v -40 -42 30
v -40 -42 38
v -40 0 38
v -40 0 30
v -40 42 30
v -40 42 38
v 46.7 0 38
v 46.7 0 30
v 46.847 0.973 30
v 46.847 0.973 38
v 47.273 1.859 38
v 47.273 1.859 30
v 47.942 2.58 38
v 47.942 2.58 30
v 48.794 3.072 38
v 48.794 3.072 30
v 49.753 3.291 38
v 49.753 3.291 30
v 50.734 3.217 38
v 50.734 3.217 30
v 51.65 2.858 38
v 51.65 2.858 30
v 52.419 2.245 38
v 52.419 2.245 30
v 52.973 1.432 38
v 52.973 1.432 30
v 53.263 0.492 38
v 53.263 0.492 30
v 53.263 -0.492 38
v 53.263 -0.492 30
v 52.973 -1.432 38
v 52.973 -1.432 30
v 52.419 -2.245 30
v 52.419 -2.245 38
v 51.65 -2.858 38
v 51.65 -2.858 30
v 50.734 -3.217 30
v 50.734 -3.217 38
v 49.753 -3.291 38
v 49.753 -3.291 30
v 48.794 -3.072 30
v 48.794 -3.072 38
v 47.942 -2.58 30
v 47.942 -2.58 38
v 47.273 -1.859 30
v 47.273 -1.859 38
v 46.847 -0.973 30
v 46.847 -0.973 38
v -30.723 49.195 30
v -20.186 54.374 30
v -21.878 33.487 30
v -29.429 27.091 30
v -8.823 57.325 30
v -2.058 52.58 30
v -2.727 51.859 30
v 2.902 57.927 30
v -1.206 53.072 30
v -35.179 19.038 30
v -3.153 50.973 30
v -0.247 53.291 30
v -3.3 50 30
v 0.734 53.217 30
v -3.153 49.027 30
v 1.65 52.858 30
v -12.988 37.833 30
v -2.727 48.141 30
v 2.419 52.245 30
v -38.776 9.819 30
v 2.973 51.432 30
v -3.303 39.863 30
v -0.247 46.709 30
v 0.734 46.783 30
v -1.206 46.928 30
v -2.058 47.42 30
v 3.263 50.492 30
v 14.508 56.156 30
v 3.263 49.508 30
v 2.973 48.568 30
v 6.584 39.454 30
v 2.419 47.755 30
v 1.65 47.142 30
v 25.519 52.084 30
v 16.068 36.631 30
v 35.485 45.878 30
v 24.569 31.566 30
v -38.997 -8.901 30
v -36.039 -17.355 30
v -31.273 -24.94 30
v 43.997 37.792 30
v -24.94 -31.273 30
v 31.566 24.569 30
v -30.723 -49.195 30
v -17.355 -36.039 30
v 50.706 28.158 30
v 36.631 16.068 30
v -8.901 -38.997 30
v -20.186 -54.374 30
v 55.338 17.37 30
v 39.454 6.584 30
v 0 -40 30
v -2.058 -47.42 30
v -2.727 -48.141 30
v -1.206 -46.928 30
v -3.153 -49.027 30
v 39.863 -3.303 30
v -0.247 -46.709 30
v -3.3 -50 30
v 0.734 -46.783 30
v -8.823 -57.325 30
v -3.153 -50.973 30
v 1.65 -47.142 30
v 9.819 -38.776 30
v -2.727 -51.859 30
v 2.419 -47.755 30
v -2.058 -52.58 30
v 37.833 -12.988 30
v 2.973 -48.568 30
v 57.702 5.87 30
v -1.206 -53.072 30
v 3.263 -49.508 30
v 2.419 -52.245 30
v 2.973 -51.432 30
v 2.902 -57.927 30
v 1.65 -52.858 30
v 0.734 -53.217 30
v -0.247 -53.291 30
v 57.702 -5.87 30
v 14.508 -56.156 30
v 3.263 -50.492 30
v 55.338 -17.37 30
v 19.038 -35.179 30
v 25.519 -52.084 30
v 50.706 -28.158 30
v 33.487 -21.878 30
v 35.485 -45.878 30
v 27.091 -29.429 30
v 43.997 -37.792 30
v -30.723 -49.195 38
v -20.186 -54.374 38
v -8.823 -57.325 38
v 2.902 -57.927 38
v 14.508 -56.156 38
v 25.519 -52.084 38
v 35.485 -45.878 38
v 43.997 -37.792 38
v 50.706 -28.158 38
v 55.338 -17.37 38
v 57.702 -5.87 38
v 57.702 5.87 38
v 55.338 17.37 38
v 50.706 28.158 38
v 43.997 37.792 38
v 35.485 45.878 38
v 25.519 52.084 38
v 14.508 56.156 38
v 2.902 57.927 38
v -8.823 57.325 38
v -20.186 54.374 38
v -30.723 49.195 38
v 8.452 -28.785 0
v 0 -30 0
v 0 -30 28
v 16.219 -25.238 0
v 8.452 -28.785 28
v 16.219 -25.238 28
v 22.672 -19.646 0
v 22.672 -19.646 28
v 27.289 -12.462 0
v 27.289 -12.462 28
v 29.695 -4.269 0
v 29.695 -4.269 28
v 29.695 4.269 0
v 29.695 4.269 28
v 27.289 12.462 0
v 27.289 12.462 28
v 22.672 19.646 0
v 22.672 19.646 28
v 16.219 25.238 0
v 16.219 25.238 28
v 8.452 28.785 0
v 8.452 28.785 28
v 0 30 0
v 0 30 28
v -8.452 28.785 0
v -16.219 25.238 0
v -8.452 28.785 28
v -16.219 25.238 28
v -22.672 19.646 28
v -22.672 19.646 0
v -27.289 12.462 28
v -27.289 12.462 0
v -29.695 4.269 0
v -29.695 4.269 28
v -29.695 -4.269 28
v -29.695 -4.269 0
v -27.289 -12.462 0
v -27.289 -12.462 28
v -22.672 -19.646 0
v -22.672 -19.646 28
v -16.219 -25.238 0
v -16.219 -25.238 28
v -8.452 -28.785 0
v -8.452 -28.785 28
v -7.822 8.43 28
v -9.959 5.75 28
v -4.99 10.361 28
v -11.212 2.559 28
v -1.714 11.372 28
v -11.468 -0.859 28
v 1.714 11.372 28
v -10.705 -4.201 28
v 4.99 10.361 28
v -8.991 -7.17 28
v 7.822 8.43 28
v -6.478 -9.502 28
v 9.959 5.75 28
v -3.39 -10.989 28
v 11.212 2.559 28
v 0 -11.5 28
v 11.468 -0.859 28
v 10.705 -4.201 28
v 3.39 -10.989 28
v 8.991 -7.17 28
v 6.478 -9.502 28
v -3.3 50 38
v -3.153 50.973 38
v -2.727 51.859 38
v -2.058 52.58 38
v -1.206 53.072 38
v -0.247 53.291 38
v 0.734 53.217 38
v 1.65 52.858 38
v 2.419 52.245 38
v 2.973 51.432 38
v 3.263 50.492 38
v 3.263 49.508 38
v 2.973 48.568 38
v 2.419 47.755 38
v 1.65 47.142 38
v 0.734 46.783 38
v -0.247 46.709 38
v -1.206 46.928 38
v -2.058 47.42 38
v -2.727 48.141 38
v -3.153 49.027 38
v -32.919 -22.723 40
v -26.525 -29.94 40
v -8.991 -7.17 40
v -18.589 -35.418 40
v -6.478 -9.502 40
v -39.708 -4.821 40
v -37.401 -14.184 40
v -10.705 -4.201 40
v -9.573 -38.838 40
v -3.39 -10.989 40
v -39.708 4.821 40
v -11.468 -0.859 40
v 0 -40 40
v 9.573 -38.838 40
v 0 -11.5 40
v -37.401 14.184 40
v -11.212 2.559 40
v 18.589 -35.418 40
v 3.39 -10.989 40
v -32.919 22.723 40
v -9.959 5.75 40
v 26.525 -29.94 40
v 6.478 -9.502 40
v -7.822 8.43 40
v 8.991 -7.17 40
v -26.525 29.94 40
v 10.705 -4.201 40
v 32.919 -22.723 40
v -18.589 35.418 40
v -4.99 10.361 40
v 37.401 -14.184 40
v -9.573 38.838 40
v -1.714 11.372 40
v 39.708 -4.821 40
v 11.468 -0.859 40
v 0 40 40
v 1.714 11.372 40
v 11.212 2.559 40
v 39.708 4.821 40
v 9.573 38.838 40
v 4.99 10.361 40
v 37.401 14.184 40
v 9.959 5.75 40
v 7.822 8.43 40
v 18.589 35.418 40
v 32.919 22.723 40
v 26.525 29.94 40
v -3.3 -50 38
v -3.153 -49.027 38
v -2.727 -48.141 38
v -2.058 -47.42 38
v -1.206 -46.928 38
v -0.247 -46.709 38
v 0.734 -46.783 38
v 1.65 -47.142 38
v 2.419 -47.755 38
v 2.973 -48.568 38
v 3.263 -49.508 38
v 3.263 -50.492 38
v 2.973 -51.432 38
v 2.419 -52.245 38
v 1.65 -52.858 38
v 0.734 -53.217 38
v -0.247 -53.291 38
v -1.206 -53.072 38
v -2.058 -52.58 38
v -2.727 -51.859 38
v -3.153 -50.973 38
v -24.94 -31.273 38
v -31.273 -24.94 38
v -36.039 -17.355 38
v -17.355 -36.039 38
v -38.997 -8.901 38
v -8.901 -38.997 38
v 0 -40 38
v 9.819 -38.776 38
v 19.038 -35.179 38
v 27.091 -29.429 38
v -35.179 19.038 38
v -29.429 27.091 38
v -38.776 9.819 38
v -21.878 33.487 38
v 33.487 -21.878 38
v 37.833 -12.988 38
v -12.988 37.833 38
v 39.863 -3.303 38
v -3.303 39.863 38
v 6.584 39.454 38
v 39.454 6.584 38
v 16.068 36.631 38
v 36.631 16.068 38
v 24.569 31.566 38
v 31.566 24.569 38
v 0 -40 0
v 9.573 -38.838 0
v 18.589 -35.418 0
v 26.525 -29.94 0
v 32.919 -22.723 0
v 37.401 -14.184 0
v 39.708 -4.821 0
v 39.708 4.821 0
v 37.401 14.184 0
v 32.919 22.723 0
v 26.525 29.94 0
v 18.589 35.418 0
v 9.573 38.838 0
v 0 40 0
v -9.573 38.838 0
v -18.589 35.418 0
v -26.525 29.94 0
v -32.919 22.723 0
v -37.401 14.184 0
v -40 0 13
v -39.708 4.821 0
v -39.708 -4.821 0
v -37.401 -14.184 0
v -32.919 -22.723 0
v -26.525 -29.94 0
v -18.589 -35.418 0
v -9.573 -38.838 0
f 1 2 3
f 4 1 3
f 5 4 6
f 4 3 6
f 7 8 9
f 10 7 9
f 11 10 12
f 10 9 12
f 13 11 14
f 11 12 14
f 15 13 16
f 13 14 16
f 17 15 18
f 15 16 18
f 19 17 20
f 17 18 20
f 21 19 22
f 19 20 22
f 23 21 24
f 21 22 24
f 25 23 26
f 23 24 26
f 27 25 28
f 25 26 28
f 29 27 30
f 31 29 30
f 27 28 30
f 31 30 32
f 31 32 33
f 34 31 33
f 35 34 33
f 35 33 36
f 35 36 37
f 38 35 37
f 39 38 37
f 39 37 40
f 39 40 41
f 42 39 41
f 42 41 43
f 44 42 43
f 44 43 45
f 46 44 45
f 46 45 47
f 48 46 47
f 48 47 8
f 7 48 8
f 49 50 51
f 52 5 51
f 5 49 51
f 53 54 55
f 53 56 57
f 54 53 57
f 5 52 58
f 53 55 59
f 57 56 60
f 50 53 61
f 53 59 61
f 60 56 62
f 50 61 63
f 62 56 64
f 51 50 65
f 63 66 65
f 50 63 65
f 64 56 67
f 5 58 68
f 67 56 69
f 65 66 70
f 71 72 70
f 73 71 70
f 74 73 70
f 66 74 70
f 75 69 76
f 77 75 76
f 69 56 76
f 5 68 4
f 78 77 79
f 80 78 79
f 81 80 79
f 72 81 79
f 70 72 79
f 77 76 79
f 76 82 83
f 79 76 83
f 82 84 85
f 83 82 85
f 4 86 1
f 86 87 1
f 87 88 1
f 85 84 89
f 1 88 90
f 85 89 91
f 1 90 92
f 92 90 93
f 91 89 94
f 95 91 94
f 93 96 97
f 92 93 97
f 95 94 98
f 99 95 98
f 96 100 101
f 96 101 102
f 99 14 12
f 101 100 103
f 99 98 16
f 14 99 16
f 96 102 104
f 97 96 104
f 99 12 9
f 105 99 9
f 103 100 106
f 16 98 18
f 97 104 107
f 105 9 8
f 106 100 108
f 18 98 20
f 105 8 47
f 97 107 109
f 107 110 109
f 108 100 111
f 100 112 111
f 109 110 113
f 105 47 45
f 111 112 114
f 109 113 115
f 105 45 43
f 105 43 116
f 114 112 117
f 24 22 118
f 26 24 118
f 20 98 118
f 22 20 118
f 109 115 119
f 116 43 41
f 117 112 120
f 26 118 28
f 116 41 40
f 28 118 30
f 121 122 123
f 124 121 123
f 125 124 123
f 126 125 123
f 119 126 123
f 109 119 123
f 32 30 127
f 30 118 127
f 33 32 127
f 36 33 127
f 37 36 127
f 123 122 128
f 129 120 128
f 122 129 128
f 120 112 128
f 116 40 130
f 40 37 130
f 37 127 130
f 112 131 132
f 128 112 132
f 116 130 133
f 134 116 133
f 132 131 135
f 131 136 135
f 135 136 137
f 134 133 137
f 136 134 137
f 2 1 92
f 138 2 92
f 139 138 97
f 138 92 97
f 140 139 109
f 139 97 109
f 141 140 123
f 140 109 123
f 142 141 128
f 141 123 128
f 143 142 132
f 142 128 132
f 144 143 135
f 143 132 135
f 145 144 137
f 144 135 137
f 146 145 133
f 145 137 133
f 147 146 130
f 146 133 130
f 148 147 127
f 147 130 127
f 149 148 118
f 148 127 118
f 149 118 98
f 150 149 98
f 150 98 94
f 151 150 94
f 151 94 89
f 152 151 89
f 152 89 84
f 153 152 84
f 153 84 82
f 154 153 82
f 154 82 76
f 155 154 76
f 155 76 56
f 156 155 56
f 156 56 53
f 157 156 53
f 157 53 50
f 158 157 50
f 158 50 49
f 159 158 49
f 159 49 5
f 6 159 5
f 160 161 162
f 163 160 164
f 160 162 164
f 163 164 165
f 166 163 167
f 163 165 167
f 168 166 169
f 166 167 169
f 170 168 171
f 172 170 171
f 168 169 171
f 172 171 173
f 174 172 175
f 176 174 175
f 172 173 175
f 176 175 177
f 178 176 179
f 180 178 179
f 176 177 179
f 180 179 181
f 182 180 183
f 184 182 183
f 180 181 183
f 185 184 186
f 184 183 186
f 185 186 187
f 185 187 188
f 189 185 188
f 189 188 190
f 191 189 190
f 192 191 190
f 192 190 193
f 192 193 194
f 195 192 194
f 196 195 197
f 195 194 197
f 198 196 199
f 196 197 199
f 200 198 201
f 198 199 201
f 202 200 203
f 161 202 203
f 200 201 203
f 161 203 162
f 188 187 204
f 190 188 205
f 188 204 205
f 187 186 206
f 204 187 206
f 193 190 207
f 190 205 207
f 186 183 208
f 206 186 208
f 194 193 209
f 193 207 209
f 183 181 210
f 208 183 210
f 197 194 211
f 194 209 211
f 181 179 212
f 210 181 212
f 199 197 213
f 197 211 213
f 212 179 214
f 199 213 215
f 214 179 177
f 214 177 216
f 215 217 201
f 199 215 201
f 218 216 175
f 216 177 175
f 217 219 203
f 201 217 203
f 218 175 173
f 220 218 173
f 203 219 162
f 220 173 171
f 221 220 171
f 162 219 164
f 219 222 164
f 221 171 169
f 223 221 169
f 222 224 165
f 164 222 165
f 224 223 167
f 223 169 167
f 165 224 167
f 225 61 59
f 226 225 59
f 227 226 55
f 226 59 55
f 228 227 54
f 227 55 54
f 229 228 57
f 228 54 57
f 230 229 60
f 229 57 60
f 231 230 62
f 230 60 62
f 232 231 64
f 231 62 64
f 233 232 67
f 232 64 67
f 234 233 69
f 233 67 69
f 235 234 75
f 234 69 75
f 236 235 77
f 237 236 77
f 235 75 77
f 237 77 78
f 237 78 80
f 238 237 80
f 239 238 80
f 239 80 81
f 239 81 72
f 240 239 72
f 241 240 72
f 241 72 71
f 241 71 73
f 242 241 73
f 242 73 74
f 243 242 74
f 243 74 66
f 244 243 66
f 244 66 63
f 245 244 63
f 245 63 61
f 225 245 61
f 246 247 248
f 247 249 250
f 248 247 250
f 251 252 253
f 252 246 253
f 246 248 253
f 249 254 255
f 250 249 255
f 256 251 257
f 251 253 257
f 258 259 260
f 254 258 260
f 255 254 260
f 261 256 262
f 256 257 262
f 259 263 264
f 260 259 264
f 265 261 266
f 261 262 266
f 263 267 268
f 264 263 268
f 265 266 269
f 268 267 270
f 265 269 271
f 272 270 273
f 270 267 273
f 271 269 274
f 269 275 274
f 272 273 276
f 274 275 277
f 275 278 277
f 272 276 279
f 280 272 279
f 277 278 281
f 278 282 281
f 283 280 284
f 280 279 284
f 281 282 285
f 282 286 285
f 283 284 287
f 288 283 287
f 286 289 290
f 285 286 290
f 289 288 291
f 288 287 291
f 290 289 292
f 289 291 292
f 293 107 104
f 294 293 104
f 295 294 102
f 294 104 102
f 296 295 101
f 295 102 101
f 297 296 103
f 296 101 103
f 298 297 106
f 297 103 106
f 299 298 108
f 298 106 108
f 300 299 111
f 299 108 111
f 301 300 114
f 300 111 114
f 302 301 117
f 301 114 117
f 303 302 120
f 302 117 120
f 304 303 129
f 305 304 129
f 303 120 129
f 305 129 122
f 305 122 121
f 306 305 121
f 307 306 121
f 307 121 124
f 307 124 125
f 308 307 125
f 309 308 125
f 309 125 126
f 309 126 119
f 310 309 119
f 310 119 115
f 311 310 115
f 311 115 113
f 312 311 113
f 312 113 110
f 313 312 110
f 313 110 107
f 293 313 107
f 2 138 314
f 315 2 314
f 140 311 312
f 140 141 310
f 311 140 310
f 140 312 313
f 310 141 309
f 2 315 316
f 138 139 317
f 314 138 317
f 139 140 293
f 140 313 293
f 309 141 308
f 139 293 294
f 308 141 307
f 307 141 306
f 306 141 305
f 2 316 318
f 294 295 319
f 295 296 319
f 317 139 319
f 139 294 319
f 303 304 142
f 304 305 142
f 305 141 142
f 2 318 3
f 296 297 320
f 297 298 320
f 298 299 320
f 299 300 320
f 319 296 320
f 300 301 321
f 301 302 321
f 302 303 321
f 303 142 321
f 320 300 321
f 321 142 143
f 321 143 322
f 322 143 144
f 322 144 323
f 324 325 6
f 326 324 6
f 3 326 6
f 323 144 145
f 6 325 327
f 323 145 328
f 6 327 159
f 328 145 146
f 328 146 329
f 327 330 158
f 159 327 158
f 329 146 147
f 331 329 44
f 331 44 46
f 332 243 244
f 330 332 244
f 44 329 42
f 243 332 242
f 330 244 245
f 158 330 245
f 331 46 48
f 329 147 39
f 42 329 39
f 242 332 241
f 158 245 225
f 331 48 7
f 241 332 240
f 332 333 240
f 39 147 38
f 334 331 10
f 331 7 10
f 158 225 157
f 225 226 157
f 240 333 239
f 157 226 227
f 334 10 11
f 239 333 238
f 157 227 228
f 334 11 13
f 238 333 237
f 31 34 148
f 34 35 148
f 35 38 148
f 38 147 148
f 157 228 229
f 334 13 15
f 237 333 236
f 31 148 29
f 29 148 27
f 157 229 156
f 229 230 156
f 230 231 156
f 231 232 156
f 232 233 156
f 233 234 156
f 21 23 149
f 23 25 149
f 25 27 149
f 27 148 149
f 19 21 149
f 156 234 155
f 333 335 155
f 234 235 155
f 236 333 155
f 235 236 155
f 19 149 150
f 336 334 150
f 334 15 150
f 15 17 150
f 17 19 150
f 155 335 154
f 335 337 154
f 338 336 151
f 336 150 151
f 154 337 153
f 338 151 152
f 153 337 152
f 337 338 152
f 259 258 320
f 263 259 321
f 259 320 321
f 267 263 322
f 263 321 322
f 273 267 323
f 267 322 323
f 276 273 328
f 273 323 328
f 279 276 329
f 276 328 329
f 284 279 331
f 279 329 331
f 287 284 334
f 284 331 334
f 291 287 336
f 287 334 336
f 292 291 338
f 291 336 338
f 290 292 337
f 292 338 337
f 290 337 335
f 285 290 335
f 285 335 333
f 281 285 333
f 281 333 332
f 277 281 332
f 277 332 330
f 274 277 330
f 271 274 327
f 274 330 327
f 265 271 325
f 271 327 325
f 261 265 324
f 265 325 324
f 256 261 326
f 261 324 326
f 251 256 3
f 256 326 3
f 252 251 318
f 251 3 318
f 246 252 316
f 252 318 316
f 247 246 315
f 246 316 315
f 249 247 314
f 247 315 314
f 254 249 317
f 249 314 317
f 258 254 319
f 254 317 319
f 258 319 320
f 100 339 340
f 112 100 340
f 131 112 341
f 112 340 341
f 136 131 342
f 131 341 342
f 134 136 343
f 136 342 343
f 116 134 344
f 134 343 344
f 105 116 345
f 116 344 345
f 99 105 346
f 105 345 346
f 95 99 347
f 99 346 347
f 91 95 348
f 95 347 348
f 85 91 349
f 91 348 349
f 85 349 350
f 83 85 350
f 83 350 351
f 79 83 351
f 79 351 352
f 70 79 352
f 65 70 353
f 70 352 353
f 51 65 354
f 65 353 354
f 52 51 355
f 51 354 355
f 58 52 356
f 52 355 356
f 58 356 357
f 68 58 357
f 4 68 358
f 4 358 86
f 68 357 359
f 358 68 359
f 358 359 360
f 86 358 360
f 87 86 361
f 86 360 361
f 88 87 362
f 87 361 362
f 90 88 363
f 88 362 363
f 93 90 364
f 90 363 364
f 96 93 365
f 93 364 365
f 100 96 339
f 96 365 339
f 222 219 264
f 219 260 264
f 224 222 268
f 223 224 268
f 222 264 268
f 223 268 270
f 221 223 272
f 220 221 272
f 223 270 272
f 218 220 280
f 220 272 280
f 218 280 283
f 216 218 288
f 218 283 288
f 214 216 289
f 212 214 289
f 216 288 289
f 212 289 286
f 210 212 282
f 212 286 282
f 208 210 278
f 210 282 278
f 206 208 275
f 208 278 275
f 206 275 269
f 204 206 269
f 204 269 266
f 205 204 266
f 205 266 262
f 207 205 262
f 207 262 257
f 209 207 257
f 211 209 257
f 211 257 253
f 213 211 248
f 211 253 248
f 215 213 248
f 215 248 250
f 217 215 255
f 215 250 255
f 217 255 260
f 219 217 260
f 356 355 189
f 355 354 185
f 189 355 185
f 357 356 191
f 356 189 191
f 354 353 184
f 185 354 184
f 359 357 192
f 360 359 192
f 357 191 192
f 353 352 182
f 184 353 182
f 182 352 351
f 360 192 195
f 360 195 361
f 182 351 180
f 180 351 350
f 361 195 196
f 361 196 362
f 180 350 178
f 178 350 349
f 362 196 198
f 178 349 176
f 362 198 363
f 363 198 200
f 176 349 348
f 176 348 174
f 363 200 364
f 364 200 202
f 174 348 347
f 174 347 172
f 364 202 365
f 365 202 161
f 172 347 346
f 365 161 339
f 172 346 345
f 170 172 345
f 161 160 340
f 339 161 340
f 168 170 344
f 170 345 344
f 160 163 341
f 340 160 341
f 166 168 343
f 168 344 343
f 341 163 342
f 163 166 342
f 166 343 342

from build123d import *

# Parameters (mm, degrees)
F3_D     = 6.6
F5_DEPTH = 25


# Not quite as in the source:
# - a feature names something its author has since deleted; it is built from what else it names


with BuildPart() as f1:
    # F0 (on Right) → F1 (revolve)
    with BuildSketch(Plane.YZ):
        Polygon((-11.5, 40), (-40, 40), (-40, 38), (-58, 38), (-58, 30), (-40, 30), (-40, 0), (-30, 0), (-30, 28), (-11.5, 28), align=None)
    revolve(axis=Axis((0, 0, 32.5555), (0, 0, 1)))

    # F3 (through all)
    with Locations(Plane.XY.offset(40)):
        with Locations((-50, 0), (0, 50), (50, 0), (0, -50)):
            Hole(F3_D / 2)

    # F4 (on face) → F5 (cut)
    with BuildSketch(Plane.XY.offset(38)):
        with BuildLine():
            Line((-40, -42), (-40, 0))
            Line((-40, 0), (-46.7, 0))
            ThreePointArc((-46.7, 0), (-50, -3.3), (-53.3, 0))
            Line((-53.3, 0), (-58, 0))
            ThreePointArc((-58, 0), (-53.310411741, -22.8473193176), (-40, -42))
        make_face()
        with BuildLine():
            Line((-46.7, 0), (-40, 0))
            Line((-40, 0), (-40, 42))
            ThreePointArc((-40, 42), (-53.310411741, 22.8473193176), (-58, 0))
            Line((-58, 0), (-53.3, 0))
            ThreePointArc((-53.3, 0), (-50, 3.3), (-46.7, 0))
        make_face()
        with BuildLine():
            Line((-40, -44.474773109), (-40, -42))
            ThreePointArc((-40, -42), (-53.310411741, -22.8473193176), (-58, 0))
            Line((-58, 0), (-66.5342658758, 0))
            Line((-66.5342658758, 0), (-66.5342658758, -44.474773109))
            Line((-66.5342658758, -44.474773109), (-40, -44.474773109))
        make_face()
        with BuildLine():
            ThreePointArc((-58, 0), (-53.310411741, 22.8473193176), (-40, 42))
            Line((-40, 42), (-40, 51.5907406807))
            Line((-40, 51.5907406807), (-66.5342658758, 51.5907406807))
            Line((-66.5342658758, 51.5907406807), (-66.5342658758, 0))
            Line((-66.5342658758, 0), (-58, 0))
        make_face()
    extrude(amount=-F5_DEPTH, mode=Mode.SUBTRACT)


solid = f1.part
